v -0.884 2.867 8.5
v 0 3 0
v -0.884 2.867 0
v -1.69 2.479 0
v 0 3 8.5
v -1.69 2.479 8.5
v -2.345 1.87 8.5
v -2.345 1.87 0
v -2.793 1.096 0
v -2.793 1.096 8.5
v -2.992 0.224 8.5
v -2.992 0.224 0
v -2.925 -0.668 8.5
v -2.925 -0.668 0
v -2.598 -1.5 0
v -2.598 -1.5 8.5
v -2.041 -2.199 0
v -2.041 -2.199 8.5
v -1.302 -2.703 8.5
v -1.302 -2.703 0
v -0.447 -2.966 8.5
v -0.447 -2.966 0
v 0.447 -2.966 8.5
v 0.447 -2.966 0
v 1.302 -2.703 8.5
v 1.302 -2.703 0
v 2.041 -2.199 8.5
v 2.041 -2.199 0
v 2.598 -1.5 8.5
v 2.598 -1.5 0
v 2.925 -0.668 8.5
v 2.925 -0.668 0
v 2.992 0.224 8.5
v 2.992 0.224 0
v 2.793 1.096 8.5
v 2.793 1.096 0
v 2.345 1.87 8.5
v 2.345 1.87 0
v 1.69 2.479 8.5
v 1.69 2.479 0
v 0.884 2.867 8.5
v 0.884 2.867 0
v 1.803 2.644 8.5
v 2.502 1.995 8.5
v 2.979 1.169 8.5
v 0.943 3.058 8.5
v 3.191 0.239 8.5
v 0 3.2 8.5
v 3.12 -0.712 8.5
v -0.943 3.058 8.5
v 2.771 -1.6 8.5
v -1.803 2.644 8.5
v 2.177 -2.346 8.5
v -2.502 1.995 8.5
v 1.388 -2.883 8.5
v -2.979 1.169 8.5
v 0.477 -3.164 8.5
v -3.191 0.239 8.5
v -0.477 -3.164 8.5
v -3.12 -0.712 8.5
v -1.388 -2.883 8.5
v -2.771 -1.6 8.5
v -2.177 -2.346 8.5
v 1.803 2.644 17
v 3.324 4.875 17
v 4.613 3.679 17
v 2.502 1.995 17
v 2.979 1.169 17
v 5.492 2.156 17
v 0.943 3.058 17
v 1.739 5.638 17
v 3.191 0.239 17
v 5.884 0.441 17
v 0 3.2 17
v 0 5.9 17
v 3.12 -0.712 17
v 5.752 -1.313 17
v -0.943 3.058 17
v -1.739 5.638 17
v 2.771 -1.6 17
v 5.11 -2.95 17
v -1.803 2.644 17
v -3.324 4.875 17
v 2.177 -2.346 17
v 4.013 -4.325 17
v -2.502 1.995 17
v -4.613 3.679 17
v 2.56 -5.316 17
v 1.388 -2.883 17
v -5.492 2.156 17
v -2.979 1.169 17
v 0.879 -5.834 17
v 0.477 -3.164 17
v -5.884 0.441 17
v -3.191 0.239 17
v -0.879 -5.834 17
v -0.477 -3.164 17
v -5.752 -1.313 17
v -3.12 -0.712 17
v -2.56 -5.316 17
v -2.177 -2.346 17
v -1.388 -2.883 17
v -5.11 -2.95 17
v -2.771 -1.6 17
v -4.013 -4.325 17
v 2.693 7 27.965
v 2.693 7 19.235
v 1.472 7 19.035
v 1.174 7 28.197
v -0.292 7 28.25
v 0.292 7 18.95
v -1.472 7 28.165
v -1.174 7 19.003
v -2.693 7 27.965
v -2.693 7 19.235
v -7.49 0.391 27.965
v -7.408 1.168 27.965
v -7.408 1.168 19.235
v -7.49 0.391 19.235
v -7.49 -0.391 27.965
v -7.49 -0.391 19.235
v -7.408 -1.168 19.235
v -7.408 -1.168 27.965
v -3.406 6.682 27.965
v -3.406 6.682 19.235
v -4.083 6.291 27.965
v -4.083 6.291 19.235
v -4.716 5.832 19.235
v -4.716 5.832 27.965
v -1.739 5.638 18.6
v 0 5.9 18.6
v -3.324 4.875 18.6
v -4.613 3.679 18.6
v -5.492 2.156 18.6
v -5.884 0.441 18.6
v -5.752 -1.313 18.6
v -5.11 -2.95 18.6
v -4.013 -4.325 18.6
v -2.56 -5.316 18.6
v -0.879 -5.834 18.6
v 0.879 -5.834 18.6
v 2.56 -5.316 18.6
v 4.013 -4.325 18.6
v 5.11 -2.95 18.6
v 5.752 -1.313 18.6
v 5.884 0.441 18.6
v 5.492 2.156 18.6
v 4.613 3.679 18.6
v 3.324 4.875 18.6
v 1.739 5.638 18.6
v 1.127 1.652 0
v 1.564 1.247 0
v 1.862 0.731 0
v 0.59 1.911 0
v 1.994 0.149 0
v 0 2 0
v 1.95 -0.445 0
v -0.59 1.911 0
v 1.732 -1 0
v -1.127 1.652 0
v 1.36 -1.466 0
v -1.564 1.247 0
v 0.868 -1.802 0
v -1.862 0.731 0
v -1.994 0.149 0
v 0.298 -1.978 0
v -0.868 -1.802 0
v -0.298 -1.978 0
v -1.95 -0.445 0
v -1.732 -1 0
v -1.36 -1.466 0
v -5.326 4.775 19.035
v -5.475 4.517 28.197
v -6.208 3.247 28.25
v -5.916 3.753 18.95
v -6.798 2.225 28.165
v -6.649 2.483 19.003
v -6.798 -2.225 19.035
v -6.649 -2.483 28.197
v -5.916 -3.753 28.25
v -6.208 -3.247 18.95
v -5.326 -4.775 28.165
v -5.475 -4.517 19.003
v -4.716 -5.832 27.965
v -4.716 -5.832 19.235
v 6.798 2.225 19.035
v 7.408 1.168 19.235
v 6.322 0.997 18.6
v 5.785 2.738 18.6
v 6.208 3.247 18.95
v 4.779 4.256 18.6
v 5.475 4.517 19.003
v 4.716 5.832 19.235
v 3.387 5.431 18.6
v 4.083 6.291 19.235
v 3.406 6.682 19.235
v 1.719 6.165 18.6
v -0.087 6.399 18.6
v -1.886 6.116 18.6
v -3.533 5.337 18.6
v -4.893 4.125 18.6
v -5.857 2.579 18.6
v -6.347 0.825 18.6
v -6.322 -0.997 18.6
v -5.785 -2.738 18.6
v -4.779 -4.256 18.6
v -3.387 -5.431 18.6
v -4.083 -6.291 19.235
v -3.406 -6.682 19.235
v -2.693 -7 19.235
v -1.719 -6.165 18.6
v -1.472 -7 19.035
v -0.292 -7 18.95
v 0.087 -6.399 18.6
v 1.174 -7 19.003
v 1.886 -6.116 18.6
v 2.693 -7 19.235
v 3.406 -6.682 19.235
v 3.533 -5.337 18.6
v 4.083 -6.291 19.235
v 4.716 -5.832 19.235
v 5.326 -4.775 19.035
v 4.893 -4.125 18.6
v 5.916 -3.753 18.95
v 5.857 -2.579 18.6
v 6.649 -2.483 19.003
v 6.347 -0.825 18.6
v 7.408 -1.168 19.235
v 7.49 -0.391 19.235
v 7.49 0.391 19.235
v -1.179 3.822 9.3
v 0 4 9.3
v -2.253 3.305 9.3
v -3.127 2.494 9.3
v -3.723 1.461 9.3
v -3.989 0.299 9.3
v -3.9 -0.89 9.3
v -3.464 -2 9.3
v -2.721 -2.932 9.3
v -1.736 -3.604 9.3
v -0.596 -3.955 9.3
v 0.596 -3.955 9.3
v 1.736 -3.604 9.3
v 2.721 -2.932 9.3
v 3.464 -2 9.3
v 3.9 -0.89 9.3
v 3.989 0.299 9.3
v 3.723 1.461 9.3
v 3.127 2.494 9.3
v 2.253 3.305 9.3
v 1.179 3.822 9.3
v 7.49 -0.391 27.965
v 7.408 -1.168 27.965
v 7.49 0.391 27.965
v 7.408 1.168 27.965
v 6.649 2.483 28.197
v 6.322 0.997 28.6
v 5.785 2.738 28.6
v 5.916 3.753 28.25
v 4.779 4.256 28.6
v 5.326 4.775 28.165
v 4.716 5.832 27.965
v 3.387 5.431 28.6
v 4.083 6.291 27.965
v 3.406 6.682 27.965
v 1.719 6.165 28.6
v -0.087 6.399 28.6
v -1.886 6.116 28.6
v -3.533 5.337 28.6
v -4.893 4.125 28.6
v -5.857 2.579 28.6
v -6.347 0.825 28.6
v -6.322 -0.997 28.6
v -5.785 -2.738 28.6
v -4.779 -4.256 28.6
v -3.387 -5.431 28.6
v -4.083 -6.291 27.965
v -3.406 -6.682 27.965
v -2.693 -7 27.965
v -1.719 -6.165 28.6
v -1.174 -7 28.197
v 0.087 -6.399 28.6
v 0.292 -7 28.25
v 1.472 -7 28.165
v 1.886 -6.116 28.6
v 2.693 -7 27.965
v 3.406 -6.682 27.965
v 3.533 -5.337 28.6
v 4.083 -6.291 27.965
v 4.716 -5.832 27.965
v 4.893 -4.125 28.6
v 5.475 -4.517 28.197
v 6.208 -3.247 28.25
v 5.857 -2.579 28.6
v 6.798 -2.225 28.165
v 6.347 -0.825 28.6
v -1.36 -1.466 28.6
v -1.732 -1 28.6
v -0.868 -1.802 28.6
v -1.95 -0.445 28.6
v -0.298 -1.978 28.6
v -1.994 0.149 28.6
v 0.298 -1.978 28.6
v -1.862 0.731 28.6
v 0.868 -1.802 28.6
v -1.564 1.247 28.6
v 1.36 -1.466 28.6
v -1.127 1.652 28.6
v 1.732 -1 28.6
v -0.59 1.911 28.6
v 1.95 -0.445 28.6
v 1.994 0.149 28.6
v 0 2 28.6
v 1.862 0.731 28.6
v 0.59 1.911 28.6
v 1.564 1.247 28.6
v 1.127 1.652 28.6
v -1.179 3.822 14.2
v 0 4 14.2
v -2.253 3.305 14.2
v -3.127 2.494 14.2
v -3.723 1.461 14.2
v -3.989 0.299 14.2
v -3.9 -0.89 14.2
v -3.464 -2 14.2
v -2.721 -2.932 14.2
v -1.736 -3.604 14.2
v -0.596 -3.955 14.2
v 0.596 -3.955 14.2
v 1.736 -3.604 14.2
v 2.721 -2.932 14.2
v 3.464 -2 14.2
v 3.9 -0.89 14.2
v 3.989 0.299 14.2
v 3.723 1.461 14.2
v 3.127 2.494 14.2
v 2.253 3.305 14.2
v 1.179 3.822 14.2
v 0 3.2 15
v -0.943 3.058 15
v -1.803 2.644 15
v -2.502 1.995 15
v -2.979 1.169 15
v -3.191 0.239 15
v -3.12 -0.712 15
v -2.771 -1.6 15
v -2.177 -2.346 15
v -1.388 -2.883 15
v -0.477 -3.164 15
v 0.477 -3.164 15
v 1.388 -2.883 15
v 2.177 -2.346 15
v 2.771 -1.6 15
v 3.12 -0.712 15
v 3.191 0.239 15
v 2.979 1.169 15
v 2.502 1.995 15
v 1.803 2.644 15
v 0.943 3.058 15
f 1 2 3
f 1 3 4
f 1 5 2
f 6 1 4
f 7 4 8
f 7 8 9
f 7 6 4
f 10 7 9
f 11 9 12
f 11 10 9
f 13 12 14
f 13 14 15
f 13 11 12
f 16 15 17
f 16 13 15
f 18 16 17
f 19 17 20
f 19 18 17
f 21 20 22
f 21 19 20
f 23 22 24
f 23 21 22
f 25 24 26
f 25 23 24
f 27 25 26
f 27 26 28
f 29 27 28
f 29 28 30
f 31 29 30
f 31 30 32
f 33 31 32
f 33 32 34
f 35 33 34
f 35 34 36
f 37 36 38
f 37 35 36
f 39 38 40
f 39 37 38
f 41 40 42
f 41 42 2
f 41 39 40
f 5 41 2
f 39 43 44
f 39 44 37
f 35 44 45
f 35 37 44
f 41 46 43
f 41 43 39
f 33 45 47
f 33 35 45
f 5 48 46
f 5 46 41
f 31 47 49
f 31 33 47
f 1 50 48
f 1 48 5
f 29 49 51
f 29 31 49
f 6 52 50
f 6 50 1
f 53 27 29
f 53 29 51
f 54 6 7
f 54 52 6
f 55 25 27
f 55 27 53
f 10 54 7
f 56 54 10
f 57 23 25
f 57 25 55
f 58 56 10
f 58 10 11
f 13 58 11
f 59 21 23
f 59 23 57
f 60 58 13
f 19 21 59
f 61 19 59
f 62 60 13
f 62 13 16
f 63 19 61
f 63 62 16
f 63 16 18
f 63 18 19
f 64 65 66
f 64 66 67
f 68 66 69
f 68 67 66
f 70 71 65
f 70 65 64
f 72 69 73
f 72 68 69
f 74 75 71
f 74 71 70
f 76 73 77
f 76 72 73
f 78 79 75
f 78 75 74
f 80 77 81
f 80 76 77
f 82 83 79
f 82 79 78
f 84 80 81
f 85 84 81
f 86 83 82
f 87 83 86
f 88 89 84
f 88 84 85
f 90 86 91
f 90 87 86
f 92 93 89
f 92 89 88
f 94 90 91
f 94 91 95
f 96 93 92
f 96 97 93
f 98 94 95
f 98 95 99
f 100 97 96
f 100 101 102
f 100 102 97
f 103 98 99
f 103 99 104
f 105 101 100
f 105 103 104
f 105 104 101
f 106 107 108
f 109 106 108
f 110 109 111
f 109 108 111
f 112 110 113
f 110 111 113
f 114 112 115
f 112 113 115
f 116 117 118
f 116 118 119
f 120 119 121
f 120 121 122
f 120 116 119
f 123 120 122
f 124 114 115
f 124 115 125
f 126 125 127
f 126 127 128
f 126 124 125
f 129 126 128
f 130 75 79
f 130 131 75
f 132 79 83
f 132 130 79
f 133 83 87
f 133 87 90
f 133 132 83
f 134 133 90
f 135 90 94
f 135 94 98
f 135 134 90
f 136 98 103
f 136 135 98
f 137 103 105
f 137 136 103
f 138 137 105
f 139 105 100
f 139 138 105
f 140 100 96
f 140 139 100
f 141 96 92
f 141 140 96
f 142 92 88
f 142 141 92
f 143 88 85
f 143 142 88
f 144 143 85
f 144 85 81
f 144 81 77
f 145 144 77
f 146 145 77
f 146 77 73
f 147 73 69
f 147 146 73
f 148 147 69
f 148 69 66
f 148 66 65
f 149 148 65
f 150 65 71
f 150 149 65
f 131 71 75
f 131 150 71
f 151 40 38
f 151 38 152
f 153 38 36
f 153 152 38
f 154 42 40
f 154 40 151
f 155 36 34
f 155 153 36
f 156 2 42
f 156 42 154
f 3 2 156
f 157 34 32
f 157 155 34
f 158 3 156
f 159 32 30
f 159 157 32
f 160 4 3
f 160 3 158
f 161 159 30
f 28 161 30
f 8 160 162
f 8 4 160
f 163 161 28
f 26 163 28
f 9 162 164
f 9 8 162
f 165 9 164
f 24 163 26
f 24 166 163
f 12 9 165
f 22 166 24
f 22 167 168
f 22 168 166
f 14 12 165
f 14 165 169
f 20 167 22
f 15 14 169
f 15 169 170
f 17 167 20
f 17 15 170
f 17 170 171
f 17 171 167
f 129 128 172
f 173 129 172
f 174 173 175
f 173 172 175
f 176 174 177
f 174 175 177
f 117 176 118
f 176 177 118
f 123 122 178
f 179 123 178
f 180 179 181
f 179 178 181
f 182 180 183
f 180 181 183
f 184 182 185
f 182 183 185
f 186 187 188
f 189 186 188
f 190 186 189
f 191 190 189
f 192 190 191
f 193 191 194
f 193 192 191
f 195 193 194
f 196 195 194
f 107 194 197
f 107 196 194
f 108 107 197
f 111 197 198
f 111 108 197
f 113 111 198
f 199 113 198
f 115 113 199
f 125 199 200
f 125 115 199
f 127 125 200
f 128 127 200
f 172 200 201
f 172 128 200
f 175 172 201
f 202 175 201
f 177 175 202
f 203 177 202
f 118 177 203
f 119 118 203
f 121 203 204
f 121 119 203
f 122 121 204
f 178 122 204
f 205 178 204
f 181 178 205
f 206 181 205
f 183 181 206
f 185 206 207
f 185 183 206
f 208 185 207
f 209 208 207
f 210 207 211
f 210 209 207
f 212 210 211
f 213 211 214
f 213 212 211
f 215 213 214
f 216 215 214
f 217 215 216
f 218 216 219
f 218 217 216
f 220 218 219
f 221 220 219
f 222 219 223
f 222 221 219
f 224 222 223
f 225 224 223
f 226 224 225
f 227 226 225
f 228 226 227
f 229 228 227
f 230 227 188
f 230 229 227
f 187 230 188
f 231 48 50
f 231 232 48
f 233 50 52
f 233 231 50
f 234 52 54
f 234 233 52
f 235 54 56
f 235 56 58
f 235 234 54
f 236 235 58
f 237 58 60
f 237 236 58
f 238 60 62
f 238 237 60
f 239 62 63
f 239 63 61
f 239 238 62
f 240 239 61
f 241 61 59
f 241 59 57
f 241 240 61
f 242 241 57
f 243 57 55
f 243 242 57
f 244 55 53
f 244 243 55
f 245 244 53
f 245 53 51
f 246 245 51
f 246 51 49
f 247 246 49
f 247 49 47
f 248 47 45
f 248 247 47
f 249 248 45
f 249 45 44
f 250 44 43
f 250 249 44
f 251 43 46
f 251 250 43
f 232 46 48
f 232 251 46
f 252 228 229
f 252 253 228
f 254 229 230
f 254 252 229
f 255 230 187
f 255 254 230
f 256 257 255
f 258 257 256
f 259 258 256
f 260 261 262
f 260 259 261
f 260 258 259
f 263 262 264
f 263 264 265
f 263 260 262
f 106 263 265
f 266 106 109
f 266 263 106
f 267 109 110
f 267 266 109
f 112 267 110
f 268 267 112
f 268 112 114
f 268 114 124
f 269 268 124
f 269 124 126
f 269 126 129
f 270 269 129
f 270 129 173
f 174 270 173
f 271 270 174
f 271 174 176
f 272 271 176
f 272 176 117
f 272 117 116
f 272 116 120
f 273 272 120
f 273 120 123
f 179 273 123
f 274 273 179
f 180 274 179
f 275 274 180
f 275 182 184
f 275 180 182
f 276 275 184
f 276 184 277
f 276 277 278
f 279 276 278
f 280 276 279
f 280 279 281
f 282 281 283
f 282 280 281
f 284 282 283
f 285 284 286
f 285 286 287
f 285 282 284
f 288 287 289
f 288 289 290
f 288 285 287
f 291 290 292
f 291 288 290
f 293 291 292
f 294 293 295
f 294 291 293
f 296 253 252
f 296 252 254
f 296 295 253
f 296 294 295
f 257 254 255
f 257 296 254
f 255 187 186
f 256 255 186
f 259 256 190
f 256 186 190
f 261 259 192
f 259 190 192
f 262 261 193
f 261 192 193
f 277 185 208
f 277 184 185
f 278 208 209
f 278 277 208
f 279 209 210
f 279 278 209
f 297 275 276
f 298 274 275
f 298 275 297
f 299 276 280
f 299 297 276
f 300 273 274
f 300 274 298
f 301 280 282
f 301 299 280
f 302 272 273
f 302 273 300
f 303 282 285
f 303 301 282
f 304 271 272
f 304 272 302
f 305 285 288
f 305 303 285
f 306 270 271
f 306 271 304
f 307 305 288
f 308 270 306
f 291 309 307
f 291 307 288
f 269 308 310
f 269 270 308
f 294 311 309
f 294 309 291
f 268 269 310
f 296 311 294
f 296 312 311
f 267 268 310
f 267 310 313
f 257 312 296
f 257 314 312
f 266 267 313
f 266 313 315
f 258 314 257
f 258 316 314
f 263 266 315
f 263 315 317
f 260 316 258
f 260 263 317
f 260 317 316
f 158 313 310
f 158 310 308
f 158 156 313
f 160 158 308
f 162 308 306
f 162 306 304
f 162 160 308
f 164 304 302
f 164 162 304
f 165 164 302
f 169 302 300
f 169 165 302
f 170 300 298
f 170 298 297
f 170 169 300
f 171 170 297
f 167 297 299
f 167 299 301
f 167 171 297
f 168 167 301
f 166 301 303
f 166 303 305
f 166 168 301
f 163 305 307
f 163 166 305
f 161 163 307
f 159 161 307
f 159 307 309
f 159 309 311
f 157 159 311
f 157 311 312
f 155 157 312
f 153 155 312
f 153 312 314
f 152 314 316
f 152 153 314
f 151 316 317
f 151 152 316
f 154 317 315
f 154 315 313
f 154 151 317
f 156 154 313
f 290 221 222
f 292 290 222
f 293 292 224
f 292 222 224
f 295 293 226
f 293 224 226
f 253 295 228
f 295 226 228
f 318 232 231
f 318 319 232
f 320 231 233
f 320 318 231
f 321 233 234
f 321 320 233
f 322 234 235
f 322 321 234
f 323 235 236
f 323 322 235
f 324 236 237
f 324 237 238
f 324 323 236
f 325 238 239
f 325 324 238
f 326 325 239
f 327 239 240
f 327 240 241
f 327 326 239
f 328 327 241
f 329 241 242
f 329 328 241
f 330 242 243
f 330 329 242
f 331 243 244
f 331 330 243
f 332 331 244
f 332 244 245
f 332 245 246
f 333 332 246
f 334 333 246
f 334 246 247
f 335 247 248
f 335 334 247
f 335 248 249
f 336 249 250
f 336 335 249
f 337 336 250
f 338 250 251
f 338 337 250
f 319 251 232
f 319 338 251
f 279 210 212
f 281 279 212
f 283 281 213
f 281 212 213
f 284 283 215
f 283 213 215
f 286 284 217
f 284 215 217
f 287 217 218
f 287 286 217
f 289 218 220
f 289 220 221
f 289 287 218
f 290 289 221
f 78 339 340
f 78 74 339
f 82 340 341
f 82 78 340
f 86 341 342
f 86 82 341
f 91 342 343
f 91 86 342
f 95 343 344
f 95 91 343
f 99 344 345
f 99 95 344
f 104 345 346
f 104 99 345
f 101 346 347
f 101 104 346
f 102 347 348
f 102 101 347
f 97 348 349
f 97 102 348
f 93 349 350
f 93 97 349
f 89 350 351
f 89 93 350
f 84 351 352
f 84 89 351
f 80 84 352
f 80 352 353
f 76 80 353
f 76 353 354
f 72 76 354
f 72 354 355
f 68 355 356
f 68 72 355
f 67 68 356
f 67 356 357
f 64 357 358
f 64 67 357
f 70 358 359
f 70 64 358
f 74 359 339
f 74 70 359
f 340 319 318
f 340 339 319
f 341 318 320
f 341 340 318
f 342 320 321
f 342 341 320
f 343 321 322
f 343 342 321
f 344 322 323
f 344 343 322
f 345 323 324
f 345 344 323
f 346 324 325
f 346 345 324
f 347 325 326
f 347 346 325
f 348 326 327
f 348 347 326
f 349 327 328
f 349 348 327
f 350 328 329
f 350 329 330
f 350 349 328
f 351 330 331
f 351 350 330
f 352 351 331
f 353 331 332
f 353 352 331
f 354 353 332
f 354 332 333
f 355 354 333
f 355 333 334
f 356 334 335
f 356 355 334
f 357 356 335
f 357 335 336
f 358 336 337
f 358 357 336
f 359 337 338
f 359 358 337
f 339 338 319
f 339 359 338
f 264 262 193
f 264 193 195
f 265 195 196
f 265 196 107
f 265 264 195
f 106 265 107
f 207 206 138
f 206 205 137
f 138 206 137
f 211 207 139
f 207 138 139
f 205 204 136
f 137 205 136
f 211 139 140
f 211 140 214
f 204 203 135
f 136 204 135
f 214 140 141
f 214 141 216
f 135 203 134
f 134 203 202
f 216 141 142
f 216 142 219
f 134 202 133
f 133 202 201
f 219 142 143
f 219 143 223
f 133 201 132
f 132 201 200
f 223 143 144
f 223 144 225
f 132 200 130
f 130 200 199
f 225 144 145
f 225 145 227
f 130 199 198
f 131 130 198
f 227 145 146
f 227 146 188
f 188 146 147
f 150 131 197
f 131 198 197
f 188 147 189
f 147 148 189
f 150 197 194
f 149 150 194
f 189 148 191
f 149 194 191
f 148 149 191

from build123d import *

# Parameters (mm, degrees)
HEX_START      = -10
SKETCH3_R      = 2
HEX_HEAD_DEPTH = 10


with BuildPart() as part:
    # Sketch1 → Main Base (revolve)
    with BuildSketch(Plane(origin=(0, 0, 0), x_dir=(0, 0, -1), z_dir=(1, 0, 0))):
        Polygon((0, 2), (0, 3), (-8.5, 3), (-8.5, 3.2), (-9.3, 4), (-14.2, 4), (-15, 3.2), (-17, 3.2), (-17, 5.9), (-18.6, 5.9), (-18.6, 7), (-28.6, 7), (-28.6, 2), align=None)
    revolve(axis=Axis((0, 0, -105.38083184), (0, 0, 1)))

    # Sketch3 → Hex Head (add)
    with BuildSketch(Plane.XY.offset(28.6).offset(HEX_START)):
        Polygon((8.082903769, 0), (4.041451884, 7), (-4.041451884, 7), (-8.082903769, 0), (-4.041451884, -7), (4.041451884, -7), align=None)
        with Locations(Location((0, 0, 0), (0, 0, 90))):
            Circle(SKETCH3_R, mode=Mode.SUBTRACT)
    extrude(amount=HEX_HEAD_DEPTH)

    # Sketch5 → Hex Trim (revolve, cut)
    with BuildSketch(Plane(origin=(0, 0, 0), x_dir=(1, 0, 0), z_dir=(0, 1, 0)), mode=Mode.PRIVATE) as hex_trim_sk:
        Polygon((-6.4, -18.6), (-7.5, -19.235085296), (-7.5, -27.964914704), (-6.4, -28.6), (-8.082903769, -28.6), (-8.082903769, -18.6), align=None)
    revolve(hex_trim_sk.sketch.rotate(Axis((0, 0, 20.51194439), (0, 0, 1)), 188.960530202), axis=Axis((0, 0, 20.51194439), (0, 0, 1)), mode=Mode.SUBTRACT)


solid = part.part
